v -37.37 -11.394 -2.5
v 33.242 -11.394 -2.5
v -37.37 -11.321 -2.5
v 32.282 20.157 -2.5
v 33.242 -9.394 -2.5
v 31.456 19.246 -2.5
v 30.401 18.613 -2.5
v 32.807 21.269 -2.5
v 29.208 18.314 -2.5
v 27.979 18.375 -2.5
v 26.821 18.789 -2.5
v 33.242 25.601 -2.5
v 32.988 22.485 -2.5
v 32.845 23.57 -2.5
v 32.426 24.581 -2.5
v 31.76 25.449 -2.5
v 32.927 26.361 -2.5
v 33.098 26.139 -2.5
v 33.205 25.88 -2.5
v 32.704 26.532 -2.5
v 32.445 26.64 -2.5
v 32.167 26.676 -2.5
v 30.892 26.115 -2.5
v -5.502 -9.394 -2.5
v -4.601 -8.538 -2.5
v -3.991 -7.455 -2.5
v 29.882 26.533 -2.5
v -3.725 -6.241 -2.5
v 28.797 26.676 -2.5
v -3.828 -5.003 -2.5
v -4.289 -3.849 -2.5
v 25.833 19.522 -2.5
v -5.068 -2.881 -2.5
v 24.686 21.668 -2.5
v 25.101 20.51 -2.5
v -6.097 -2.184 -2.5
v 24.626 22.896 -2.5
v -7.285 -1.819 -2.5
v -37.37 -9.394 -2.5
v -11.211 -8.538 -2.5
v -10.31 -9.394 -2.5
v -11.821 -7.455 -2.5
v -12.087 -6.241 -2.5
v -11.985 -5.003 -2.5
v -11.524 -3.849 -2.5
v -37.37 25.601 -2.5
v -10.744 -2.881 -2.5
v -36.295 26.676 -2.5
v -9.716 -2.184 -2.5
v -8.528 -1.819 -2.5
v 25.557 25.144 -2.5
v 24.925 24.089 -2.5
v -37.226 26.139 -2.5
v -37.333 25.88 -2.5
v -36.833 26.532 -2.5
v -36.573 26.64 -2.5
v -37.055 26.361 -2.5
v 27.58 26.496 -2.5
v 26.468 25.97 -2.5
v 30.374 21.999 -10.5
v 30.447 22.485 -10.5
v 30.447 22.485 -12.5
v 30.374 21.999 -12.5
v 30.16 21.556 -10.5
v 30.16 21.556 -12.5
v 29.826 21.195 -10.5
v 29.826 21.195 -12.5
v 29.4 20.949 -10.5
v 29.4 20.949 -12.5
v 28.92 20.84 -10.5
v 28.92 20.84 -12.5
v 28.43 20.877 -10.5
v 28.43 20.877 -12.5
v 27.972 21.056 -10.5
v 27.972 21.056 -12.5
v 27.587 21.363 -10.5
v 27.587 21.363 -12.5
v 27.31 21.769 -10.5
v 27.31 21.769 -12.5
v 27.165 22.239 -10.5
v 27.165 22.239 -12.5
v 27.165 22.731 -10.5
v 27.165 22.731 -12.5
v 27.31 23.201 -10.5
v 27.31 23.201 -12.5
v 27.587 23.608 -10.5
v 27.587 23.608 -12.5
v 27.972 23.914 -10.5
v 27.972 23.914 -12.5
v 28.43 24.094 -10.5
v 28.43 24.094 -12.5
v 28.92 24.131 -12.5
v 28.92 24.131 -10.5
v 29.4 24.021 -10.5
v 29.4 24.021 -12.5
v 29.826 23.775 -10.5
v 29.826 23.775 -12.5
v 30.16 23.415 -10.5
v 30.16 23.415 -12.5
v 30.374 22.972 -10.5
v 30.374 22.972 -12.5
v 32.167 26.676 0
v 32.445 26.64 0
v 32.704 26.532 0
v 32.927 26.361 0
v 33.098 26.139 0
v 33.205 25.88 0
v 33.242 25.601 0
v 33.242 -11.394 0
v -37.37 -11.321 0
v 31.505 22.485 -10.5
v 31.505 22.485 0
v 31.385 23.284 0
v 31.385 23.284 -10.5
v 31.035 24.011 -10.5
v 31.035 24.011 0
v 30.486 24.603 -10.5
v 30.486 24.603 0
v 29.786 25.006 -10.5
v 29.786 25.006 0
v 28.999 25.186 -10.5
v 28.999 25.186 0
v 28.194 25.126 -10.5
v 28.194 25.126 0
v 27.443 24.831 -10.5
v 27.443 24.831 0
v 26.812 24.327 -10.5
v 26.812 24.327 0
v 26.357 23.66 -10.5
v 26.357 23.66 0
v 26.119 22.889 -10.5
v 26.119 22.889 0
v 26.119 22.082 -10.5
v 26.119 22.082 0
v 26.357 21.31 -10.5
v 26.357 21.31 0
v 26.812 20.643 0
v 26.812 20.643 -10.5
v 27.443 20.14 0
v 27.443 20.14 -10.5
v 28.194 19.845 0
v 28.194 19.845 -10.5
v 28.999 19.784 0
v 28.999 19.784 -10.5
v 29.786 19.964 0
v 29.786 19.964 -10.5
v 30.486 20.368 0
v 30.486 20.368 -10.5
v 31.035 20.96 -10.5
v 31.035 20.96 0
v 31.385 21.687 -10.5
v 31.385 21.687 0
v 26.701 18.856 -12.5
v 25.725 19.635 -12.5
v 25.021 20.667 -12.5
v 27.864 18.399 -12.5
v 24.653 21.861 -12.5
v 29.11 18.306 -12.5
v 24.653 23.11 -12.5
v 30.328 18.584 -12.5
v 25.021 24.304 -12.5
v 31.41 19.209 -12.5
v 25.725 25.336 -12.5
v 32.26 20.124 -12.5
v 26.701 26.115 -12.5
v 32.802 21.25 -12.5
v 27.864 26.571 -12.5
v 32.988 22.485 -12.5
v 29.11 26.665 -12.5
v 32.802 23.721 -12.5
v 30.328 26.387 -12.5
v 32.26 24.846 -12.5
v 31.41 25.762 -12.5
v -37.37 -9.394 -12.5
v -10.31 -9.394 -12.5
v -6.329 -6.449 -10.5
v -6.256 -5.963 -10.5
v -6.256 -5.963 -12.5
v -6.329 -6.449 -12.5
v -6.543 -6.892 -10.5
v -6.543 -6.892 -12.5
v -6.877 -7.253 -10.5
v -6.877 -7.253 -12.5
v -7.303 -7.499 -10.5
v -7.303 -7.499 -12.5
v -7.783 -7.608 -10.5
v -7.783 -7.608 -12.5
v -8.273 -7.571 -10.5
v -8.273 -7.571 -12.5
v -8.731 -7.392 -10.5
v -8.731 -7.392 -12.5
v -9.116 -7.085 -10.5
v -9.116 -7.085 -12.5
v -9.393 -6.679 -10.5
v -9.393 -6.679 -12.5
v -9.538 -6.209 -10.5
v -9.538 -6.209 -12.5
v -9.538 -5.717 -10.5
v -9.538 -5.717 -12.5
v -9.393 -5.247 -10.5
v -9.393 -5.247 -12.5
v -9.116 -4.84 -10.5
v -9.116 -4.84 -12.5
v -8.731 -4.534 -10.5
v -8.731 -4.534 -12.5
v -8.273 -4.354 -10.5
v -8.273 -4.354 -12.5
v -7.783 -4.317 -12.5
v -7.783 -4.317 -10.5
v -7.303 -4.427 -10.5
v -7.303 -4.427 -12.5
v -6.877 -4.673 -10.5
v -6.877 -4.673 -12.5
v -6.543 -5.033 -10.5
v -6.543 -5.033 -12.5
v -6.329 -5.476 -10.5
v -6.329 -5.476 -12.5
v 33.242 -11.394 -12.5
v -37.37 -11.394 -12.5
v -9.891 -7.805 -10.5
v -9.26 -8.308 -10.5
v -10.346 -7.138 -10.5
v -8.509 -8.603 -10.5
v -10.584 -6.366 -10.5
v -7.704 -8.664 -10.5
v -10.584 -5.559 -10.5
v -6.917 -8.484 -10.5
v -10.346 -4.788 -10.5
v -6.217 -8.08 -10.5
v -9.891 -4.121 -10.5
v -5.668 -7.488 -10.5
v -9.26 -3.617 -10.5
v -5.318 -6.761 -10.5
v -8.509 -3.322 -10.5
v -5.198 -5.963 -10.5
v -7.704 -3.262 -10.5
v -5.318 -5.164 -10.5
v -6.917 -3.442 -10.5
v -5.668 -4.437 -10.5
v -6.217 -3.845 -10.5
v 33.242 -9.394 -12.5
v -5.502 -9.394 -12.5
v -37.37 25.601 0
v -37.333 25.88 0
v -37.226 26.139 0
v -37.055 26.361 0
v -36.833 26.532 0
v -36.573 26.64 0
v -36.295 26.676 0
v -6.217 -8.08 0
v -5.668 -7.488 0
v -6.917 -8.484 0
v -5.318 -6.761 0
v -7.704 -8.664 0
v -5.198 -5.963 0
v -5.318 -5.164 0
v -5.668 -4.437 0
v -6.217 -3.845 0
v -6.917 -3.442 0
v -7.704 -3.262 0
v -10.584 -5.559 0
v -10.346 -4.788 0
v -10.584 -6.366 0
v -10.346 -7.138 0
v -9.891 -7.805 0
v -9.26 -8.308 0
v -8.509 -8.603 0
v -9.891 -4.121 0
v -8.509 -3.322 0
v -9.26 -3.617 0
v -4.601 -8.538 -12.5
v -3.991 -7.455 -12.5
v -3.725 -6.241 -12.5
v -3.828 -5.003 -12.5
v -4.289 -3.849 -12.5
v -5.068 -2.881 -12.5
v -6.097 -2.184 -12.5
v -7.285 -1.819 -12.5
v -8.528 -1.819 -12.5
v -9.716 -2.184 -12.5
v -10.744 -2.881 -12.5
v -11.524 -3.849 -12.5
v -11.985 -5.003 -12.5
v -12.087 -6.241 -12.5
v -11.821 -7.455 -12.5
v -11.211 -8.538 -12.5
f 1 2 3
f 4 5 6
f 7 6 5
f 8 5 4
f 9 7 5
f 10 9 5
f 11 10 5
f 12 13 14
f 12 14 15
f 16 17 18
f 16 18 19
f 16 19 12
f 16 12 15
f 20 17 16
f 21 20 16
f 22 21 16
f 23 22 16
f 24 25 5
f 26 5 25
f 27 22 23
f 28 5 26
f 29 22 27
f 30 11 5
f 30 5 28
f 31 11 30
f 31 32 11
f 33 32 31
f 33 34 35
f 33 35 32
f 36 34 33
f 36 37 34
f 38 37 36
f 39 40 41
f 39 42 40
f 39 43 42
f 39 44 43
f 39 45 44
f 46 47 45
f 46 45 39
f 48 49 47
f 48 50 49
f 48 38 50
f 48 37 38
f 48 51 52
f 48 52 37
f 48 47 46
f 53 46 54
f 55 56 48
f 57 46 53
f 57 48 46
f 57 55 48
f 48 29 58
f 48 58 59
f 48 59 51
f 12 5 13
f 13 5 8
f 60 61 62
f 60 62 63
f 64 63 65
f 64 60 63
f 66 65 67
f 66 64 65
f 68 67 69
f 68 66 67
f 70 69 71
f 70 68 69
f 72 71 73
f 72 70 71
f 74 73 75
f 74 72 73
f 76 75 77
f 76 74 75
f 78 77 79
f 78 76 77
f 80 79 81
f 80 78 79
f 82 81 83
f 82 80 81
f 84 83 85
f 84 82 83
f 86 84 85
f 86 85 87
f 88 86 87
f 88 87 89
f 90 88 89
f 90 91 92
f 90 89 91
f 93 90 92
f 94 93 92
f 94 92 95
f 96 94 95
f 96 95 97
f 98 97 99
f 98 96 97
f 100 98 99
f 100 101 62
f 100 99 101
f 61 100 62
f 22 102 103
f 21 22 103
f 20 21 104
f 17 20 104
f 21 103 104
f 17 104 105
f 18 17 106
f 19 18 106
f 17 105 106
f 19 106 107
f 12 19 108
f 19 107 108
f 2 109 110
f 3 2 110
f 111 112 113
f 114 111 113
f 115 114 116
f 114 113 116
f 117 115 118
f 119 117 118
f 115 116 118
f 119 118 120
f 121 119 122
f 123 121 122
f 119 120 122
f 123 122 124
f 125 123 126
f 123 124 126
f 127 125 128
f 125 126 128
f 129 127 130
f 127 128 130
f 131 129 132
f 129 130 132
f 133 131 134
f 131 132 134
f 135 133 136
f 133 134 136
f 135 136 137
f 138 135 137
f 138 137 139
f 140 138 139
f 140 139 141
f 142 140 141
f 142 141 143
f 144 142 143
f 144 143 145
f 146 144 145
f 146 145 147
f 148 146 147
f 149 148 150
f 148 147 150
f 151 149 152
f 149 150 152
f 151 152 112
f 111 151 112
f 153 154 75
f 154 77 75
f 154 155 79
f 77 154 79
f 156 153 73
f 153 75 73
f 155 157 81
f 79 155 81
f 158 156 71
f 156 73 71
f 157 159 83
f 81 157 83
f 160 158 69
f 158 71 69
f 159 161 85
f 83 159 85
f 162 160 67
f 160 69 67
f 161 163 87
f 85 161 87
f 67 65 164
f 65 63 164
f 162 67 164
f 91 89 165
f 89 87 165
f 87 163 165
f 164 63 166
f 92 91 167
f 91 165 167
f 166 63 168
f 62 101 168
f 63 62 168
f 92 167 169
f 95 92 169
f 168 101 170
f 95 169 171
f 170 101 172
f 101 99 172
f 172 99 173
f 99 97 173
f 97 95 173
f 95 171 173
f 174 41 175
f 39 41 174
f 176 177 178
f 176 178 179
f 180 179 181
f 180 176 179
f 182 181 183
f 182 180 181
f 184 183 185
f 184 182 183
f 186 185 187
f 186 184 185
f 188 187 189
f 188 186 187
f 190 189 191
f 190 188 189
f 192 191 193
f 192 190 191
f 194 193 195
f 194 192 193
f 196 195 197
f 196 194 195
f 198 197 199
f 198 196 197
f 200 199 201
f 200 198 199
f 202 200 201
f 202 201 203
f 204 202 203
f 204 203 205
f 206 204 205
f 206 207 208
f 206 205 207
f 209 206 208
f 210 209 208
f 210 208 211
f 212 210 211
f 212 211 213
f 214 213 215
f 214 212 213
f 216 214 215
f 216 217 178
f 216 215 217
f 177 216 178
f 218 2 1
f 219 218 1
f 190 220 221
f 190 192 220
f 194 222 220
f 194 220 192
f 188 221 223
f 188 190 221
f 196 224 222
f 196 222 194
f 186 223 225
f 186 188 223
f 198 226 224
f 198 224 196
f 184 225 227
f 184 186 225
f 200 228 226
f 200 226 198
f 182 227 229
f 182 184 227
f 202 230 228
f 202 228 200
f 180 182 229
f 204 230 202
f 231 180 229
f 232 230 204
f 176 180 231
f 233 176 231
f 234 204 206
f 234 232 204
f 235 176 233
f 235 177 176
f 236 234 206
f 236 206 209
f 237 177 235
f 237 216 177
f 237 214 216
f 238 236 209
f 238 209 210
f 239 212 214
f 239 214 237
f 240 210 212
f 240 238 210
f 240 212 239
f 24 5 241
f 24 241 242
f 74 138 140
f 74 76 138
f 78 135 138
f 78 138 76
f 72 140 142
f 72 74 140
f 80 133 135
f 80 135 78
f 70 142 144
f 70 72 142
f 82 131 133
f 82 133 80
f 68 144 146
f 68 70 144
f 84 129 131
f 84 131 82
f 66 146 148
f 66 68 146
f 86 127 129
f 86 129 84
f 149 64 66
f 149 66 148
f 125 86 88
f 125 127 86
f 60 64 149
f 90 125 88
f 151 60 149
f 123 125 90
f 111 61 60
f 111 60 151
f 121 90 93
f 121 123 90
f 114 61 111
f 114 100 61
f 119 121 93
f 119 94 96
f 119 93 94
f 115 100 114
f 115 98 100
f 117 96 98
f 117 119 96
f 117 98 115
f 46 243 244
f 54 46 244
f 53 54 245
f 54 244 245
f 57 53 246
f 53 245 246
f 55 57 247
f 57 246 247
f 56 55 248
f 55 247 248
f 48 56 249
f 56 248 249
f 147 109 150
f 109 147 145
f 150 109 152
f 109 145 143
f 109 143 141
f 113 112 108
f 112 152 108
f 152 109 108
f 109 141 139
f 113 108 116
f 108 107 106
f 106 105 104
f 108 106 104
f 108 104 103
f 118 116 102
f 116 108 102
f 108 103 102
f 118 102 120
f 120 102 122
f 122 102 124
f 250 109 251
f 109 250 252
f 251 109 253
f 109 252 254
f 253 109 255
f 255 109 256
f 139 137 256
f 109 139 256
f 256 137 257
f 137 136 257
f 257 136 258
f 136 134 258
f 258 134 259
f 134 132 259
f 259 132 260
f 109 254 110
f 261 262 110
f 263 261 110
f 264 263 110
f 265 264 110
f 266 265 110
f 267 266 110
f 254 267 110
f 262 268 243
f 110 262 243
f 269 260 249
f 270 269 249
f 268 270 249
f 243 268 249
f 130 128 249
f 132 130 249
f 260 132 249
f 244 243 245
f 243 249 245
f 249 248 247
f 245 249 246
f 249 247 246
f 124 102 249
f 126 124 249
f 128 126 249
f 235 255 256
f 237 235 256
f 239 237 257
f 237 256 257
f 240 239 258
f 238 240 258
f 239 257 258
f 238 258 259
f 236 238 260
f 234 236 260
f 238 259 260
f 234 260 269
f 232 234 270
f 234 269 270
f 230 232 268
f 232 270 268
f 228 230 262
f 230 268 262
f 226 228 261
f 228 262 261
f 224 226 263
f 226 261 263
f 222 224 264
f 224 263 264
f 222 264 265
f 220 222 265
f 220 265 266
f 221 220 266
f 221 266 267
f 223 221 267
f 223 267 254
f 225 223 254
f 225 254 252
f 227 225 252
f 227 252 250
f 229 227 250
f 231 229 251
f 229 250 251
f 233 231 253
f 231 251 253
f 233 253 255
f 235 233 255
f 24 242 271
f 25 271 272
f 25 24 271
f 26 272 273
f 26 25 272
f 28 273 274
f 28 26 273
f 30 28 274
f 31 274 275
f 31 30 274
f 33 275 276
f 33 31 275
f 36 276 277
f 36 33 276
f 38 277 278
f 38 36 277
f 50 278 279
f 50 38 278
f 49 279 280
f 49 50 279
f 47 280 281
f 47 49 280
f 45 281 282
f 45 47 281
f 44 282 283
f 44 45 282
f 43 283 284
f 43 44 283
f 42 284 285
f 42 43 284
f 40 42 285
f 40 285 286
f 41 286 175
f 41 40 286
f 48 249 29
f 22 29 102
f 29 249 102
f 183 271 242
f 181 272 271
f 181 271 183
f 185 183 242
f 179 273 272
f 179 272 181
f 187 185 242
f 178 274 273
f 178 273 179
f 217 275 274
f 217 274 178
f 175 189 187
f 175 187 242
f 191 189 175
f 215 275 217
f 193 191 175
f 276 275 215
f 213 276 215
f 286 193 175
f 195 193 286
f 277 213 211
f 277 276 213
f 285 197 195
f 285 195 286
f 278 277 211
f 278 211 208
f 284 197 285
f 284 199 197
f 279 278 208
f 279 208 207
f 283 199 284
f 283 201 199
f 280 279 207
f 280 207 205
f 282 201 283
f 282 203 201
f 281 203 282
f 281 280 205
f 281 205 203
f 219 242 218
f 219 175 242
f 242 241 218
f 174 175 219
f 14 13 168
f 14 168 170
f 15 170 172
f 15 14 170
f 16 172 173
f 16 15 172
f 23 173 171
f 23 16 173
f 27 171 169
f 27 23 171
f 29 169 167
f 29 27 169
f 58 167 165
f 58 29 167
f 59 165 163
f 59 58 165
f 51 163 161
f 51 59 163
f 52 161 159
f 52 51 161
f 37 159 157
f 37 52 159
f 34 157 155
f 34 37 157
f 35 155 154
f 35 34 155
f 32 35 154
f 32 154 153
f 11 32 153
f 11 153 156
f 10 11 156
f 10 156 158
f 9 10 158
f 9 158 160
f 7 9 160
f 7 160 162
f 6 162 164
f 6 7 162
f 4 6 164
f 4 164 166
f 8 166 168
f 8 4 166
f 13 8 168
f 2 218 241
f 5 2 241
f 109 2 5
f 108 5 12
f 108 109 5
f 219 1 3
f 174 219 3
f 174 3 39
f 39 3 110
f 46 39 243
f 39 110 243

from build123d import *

# Parameters (mm, degrees)
EXTRUDE_1_DEPTH          = 2.5
SKETCH_4_W               = 70.612
SKETCH_4_H               = 2
EXTRUDE_2_DEPTH          = 10
SKETCH_5_R               = 4.19
SKETCH_5_R_2             = 4.191
EXTRUDE_3_DEPTH          = 12.5
SKETCH_7_R               = 2.7083489
SKETCH_7_R_2             = 2.708349387
CUT_EXTRUDE_1_DEPTH      = 10.5
CUT_EXTRUDE_2_DEPTH      = 48.585689944
CUT_EXTRUDE_2_DEPTH_BACK = 48.585689944
SKETCH_8_R               = 1.65


with BuildPart() as part:
    # 草图3 → 凸台-拉伸1 (new body)
    with BuildSketch(Plane.XY):
        with BuildLine():
            Line((-36.295196216, 26.676238556), (32.166947784, 26.676238556))
            ThreePointArc((32.166947784, 26.676238556), (32.927036662, 26.361399434), (33.241875784, 25.601310556))
            Line((33.241875784, 25.601310556), (33.241875784, -11.394297444))
            Line((33.241875784, -11.394297444), (-37.370124216, -11.320561244))
            Line((-37.370124216, -11.320561244), (-37.370124216, 25.601297856))
            ThreePointArc((-37.370124216, 25.601297856), (-37.055289584, 26.361394944), (-36.295196216, 26.676238556))
        make_face()
    extrude(amount=-EXTRUDE_1_DEPTH)

    # 草图4 → 凸台-拉伸2 (add)
    with BuildSketch(Plane(origin=(0, 0, -2.5), x_dir=(-1, 0, 0), z_dir=(0, 0, -1))):
        with Locations((2.064124216, -10.394297444)):
            Rectangle(SKETCH_4_W, SKETCH_4_H)
    extrude(amount=EXTRUDE_2_DEPTH)

    # 草图5 → 凸台-拉伸3 (add)
    with BuildSketch(Plane.XY):
        with Locations((-7.906124216, -5.962761444)):
            Circle(SKETCH_5_R)
        with Locations((28.796875784, 22.485238556)):
            Circle(SKETCH_5_R_2)
    extrude(amount=-EXTRUDE_3_DEPTH)

    # 草图7 → 切除-拉伸1 (cut)
    with BuildSketch(Plane.XY):
        with Locations((-7.906124216, -5.962761444)):
            Circle(SKETCH_7_R)
        with Locations((28.796875784, 22.485238556)):
            Circle(SKETCH_7_R_2)
    extrude(amount=-CUT_EXTRUDE_1_DEPTH, mode=Mode.SUBTRACT)

    # 草图8 → 切除-拉伸2 (cut, two sides: drawn at the far end of the back side and taken through both)
    with BuildSketch(Plane(origin=(0, 0, -12.5), x_dir=(-1, 0, 0), z_dir=(0, 0, -1)).offset(-CUT_EXTRUDE_2_DEPTH_BACK)):
        with Locations(Location((-28.796875784, 22.485238556, 0), (0, 0, 180))):
            Circle(SKETCH_8_R)
        with Locations(Location((7.906124216, -5.962761444, 0), (0, 0, 180))):
            Circle(SKETCH_8_R)
    extrude(amount=CUT_EXTRUDE_2_DEPTH + CUT_EXTRUDE_2_DEPTH_BACK, mode=Mode.SUBTRACT)


solid = part.part
